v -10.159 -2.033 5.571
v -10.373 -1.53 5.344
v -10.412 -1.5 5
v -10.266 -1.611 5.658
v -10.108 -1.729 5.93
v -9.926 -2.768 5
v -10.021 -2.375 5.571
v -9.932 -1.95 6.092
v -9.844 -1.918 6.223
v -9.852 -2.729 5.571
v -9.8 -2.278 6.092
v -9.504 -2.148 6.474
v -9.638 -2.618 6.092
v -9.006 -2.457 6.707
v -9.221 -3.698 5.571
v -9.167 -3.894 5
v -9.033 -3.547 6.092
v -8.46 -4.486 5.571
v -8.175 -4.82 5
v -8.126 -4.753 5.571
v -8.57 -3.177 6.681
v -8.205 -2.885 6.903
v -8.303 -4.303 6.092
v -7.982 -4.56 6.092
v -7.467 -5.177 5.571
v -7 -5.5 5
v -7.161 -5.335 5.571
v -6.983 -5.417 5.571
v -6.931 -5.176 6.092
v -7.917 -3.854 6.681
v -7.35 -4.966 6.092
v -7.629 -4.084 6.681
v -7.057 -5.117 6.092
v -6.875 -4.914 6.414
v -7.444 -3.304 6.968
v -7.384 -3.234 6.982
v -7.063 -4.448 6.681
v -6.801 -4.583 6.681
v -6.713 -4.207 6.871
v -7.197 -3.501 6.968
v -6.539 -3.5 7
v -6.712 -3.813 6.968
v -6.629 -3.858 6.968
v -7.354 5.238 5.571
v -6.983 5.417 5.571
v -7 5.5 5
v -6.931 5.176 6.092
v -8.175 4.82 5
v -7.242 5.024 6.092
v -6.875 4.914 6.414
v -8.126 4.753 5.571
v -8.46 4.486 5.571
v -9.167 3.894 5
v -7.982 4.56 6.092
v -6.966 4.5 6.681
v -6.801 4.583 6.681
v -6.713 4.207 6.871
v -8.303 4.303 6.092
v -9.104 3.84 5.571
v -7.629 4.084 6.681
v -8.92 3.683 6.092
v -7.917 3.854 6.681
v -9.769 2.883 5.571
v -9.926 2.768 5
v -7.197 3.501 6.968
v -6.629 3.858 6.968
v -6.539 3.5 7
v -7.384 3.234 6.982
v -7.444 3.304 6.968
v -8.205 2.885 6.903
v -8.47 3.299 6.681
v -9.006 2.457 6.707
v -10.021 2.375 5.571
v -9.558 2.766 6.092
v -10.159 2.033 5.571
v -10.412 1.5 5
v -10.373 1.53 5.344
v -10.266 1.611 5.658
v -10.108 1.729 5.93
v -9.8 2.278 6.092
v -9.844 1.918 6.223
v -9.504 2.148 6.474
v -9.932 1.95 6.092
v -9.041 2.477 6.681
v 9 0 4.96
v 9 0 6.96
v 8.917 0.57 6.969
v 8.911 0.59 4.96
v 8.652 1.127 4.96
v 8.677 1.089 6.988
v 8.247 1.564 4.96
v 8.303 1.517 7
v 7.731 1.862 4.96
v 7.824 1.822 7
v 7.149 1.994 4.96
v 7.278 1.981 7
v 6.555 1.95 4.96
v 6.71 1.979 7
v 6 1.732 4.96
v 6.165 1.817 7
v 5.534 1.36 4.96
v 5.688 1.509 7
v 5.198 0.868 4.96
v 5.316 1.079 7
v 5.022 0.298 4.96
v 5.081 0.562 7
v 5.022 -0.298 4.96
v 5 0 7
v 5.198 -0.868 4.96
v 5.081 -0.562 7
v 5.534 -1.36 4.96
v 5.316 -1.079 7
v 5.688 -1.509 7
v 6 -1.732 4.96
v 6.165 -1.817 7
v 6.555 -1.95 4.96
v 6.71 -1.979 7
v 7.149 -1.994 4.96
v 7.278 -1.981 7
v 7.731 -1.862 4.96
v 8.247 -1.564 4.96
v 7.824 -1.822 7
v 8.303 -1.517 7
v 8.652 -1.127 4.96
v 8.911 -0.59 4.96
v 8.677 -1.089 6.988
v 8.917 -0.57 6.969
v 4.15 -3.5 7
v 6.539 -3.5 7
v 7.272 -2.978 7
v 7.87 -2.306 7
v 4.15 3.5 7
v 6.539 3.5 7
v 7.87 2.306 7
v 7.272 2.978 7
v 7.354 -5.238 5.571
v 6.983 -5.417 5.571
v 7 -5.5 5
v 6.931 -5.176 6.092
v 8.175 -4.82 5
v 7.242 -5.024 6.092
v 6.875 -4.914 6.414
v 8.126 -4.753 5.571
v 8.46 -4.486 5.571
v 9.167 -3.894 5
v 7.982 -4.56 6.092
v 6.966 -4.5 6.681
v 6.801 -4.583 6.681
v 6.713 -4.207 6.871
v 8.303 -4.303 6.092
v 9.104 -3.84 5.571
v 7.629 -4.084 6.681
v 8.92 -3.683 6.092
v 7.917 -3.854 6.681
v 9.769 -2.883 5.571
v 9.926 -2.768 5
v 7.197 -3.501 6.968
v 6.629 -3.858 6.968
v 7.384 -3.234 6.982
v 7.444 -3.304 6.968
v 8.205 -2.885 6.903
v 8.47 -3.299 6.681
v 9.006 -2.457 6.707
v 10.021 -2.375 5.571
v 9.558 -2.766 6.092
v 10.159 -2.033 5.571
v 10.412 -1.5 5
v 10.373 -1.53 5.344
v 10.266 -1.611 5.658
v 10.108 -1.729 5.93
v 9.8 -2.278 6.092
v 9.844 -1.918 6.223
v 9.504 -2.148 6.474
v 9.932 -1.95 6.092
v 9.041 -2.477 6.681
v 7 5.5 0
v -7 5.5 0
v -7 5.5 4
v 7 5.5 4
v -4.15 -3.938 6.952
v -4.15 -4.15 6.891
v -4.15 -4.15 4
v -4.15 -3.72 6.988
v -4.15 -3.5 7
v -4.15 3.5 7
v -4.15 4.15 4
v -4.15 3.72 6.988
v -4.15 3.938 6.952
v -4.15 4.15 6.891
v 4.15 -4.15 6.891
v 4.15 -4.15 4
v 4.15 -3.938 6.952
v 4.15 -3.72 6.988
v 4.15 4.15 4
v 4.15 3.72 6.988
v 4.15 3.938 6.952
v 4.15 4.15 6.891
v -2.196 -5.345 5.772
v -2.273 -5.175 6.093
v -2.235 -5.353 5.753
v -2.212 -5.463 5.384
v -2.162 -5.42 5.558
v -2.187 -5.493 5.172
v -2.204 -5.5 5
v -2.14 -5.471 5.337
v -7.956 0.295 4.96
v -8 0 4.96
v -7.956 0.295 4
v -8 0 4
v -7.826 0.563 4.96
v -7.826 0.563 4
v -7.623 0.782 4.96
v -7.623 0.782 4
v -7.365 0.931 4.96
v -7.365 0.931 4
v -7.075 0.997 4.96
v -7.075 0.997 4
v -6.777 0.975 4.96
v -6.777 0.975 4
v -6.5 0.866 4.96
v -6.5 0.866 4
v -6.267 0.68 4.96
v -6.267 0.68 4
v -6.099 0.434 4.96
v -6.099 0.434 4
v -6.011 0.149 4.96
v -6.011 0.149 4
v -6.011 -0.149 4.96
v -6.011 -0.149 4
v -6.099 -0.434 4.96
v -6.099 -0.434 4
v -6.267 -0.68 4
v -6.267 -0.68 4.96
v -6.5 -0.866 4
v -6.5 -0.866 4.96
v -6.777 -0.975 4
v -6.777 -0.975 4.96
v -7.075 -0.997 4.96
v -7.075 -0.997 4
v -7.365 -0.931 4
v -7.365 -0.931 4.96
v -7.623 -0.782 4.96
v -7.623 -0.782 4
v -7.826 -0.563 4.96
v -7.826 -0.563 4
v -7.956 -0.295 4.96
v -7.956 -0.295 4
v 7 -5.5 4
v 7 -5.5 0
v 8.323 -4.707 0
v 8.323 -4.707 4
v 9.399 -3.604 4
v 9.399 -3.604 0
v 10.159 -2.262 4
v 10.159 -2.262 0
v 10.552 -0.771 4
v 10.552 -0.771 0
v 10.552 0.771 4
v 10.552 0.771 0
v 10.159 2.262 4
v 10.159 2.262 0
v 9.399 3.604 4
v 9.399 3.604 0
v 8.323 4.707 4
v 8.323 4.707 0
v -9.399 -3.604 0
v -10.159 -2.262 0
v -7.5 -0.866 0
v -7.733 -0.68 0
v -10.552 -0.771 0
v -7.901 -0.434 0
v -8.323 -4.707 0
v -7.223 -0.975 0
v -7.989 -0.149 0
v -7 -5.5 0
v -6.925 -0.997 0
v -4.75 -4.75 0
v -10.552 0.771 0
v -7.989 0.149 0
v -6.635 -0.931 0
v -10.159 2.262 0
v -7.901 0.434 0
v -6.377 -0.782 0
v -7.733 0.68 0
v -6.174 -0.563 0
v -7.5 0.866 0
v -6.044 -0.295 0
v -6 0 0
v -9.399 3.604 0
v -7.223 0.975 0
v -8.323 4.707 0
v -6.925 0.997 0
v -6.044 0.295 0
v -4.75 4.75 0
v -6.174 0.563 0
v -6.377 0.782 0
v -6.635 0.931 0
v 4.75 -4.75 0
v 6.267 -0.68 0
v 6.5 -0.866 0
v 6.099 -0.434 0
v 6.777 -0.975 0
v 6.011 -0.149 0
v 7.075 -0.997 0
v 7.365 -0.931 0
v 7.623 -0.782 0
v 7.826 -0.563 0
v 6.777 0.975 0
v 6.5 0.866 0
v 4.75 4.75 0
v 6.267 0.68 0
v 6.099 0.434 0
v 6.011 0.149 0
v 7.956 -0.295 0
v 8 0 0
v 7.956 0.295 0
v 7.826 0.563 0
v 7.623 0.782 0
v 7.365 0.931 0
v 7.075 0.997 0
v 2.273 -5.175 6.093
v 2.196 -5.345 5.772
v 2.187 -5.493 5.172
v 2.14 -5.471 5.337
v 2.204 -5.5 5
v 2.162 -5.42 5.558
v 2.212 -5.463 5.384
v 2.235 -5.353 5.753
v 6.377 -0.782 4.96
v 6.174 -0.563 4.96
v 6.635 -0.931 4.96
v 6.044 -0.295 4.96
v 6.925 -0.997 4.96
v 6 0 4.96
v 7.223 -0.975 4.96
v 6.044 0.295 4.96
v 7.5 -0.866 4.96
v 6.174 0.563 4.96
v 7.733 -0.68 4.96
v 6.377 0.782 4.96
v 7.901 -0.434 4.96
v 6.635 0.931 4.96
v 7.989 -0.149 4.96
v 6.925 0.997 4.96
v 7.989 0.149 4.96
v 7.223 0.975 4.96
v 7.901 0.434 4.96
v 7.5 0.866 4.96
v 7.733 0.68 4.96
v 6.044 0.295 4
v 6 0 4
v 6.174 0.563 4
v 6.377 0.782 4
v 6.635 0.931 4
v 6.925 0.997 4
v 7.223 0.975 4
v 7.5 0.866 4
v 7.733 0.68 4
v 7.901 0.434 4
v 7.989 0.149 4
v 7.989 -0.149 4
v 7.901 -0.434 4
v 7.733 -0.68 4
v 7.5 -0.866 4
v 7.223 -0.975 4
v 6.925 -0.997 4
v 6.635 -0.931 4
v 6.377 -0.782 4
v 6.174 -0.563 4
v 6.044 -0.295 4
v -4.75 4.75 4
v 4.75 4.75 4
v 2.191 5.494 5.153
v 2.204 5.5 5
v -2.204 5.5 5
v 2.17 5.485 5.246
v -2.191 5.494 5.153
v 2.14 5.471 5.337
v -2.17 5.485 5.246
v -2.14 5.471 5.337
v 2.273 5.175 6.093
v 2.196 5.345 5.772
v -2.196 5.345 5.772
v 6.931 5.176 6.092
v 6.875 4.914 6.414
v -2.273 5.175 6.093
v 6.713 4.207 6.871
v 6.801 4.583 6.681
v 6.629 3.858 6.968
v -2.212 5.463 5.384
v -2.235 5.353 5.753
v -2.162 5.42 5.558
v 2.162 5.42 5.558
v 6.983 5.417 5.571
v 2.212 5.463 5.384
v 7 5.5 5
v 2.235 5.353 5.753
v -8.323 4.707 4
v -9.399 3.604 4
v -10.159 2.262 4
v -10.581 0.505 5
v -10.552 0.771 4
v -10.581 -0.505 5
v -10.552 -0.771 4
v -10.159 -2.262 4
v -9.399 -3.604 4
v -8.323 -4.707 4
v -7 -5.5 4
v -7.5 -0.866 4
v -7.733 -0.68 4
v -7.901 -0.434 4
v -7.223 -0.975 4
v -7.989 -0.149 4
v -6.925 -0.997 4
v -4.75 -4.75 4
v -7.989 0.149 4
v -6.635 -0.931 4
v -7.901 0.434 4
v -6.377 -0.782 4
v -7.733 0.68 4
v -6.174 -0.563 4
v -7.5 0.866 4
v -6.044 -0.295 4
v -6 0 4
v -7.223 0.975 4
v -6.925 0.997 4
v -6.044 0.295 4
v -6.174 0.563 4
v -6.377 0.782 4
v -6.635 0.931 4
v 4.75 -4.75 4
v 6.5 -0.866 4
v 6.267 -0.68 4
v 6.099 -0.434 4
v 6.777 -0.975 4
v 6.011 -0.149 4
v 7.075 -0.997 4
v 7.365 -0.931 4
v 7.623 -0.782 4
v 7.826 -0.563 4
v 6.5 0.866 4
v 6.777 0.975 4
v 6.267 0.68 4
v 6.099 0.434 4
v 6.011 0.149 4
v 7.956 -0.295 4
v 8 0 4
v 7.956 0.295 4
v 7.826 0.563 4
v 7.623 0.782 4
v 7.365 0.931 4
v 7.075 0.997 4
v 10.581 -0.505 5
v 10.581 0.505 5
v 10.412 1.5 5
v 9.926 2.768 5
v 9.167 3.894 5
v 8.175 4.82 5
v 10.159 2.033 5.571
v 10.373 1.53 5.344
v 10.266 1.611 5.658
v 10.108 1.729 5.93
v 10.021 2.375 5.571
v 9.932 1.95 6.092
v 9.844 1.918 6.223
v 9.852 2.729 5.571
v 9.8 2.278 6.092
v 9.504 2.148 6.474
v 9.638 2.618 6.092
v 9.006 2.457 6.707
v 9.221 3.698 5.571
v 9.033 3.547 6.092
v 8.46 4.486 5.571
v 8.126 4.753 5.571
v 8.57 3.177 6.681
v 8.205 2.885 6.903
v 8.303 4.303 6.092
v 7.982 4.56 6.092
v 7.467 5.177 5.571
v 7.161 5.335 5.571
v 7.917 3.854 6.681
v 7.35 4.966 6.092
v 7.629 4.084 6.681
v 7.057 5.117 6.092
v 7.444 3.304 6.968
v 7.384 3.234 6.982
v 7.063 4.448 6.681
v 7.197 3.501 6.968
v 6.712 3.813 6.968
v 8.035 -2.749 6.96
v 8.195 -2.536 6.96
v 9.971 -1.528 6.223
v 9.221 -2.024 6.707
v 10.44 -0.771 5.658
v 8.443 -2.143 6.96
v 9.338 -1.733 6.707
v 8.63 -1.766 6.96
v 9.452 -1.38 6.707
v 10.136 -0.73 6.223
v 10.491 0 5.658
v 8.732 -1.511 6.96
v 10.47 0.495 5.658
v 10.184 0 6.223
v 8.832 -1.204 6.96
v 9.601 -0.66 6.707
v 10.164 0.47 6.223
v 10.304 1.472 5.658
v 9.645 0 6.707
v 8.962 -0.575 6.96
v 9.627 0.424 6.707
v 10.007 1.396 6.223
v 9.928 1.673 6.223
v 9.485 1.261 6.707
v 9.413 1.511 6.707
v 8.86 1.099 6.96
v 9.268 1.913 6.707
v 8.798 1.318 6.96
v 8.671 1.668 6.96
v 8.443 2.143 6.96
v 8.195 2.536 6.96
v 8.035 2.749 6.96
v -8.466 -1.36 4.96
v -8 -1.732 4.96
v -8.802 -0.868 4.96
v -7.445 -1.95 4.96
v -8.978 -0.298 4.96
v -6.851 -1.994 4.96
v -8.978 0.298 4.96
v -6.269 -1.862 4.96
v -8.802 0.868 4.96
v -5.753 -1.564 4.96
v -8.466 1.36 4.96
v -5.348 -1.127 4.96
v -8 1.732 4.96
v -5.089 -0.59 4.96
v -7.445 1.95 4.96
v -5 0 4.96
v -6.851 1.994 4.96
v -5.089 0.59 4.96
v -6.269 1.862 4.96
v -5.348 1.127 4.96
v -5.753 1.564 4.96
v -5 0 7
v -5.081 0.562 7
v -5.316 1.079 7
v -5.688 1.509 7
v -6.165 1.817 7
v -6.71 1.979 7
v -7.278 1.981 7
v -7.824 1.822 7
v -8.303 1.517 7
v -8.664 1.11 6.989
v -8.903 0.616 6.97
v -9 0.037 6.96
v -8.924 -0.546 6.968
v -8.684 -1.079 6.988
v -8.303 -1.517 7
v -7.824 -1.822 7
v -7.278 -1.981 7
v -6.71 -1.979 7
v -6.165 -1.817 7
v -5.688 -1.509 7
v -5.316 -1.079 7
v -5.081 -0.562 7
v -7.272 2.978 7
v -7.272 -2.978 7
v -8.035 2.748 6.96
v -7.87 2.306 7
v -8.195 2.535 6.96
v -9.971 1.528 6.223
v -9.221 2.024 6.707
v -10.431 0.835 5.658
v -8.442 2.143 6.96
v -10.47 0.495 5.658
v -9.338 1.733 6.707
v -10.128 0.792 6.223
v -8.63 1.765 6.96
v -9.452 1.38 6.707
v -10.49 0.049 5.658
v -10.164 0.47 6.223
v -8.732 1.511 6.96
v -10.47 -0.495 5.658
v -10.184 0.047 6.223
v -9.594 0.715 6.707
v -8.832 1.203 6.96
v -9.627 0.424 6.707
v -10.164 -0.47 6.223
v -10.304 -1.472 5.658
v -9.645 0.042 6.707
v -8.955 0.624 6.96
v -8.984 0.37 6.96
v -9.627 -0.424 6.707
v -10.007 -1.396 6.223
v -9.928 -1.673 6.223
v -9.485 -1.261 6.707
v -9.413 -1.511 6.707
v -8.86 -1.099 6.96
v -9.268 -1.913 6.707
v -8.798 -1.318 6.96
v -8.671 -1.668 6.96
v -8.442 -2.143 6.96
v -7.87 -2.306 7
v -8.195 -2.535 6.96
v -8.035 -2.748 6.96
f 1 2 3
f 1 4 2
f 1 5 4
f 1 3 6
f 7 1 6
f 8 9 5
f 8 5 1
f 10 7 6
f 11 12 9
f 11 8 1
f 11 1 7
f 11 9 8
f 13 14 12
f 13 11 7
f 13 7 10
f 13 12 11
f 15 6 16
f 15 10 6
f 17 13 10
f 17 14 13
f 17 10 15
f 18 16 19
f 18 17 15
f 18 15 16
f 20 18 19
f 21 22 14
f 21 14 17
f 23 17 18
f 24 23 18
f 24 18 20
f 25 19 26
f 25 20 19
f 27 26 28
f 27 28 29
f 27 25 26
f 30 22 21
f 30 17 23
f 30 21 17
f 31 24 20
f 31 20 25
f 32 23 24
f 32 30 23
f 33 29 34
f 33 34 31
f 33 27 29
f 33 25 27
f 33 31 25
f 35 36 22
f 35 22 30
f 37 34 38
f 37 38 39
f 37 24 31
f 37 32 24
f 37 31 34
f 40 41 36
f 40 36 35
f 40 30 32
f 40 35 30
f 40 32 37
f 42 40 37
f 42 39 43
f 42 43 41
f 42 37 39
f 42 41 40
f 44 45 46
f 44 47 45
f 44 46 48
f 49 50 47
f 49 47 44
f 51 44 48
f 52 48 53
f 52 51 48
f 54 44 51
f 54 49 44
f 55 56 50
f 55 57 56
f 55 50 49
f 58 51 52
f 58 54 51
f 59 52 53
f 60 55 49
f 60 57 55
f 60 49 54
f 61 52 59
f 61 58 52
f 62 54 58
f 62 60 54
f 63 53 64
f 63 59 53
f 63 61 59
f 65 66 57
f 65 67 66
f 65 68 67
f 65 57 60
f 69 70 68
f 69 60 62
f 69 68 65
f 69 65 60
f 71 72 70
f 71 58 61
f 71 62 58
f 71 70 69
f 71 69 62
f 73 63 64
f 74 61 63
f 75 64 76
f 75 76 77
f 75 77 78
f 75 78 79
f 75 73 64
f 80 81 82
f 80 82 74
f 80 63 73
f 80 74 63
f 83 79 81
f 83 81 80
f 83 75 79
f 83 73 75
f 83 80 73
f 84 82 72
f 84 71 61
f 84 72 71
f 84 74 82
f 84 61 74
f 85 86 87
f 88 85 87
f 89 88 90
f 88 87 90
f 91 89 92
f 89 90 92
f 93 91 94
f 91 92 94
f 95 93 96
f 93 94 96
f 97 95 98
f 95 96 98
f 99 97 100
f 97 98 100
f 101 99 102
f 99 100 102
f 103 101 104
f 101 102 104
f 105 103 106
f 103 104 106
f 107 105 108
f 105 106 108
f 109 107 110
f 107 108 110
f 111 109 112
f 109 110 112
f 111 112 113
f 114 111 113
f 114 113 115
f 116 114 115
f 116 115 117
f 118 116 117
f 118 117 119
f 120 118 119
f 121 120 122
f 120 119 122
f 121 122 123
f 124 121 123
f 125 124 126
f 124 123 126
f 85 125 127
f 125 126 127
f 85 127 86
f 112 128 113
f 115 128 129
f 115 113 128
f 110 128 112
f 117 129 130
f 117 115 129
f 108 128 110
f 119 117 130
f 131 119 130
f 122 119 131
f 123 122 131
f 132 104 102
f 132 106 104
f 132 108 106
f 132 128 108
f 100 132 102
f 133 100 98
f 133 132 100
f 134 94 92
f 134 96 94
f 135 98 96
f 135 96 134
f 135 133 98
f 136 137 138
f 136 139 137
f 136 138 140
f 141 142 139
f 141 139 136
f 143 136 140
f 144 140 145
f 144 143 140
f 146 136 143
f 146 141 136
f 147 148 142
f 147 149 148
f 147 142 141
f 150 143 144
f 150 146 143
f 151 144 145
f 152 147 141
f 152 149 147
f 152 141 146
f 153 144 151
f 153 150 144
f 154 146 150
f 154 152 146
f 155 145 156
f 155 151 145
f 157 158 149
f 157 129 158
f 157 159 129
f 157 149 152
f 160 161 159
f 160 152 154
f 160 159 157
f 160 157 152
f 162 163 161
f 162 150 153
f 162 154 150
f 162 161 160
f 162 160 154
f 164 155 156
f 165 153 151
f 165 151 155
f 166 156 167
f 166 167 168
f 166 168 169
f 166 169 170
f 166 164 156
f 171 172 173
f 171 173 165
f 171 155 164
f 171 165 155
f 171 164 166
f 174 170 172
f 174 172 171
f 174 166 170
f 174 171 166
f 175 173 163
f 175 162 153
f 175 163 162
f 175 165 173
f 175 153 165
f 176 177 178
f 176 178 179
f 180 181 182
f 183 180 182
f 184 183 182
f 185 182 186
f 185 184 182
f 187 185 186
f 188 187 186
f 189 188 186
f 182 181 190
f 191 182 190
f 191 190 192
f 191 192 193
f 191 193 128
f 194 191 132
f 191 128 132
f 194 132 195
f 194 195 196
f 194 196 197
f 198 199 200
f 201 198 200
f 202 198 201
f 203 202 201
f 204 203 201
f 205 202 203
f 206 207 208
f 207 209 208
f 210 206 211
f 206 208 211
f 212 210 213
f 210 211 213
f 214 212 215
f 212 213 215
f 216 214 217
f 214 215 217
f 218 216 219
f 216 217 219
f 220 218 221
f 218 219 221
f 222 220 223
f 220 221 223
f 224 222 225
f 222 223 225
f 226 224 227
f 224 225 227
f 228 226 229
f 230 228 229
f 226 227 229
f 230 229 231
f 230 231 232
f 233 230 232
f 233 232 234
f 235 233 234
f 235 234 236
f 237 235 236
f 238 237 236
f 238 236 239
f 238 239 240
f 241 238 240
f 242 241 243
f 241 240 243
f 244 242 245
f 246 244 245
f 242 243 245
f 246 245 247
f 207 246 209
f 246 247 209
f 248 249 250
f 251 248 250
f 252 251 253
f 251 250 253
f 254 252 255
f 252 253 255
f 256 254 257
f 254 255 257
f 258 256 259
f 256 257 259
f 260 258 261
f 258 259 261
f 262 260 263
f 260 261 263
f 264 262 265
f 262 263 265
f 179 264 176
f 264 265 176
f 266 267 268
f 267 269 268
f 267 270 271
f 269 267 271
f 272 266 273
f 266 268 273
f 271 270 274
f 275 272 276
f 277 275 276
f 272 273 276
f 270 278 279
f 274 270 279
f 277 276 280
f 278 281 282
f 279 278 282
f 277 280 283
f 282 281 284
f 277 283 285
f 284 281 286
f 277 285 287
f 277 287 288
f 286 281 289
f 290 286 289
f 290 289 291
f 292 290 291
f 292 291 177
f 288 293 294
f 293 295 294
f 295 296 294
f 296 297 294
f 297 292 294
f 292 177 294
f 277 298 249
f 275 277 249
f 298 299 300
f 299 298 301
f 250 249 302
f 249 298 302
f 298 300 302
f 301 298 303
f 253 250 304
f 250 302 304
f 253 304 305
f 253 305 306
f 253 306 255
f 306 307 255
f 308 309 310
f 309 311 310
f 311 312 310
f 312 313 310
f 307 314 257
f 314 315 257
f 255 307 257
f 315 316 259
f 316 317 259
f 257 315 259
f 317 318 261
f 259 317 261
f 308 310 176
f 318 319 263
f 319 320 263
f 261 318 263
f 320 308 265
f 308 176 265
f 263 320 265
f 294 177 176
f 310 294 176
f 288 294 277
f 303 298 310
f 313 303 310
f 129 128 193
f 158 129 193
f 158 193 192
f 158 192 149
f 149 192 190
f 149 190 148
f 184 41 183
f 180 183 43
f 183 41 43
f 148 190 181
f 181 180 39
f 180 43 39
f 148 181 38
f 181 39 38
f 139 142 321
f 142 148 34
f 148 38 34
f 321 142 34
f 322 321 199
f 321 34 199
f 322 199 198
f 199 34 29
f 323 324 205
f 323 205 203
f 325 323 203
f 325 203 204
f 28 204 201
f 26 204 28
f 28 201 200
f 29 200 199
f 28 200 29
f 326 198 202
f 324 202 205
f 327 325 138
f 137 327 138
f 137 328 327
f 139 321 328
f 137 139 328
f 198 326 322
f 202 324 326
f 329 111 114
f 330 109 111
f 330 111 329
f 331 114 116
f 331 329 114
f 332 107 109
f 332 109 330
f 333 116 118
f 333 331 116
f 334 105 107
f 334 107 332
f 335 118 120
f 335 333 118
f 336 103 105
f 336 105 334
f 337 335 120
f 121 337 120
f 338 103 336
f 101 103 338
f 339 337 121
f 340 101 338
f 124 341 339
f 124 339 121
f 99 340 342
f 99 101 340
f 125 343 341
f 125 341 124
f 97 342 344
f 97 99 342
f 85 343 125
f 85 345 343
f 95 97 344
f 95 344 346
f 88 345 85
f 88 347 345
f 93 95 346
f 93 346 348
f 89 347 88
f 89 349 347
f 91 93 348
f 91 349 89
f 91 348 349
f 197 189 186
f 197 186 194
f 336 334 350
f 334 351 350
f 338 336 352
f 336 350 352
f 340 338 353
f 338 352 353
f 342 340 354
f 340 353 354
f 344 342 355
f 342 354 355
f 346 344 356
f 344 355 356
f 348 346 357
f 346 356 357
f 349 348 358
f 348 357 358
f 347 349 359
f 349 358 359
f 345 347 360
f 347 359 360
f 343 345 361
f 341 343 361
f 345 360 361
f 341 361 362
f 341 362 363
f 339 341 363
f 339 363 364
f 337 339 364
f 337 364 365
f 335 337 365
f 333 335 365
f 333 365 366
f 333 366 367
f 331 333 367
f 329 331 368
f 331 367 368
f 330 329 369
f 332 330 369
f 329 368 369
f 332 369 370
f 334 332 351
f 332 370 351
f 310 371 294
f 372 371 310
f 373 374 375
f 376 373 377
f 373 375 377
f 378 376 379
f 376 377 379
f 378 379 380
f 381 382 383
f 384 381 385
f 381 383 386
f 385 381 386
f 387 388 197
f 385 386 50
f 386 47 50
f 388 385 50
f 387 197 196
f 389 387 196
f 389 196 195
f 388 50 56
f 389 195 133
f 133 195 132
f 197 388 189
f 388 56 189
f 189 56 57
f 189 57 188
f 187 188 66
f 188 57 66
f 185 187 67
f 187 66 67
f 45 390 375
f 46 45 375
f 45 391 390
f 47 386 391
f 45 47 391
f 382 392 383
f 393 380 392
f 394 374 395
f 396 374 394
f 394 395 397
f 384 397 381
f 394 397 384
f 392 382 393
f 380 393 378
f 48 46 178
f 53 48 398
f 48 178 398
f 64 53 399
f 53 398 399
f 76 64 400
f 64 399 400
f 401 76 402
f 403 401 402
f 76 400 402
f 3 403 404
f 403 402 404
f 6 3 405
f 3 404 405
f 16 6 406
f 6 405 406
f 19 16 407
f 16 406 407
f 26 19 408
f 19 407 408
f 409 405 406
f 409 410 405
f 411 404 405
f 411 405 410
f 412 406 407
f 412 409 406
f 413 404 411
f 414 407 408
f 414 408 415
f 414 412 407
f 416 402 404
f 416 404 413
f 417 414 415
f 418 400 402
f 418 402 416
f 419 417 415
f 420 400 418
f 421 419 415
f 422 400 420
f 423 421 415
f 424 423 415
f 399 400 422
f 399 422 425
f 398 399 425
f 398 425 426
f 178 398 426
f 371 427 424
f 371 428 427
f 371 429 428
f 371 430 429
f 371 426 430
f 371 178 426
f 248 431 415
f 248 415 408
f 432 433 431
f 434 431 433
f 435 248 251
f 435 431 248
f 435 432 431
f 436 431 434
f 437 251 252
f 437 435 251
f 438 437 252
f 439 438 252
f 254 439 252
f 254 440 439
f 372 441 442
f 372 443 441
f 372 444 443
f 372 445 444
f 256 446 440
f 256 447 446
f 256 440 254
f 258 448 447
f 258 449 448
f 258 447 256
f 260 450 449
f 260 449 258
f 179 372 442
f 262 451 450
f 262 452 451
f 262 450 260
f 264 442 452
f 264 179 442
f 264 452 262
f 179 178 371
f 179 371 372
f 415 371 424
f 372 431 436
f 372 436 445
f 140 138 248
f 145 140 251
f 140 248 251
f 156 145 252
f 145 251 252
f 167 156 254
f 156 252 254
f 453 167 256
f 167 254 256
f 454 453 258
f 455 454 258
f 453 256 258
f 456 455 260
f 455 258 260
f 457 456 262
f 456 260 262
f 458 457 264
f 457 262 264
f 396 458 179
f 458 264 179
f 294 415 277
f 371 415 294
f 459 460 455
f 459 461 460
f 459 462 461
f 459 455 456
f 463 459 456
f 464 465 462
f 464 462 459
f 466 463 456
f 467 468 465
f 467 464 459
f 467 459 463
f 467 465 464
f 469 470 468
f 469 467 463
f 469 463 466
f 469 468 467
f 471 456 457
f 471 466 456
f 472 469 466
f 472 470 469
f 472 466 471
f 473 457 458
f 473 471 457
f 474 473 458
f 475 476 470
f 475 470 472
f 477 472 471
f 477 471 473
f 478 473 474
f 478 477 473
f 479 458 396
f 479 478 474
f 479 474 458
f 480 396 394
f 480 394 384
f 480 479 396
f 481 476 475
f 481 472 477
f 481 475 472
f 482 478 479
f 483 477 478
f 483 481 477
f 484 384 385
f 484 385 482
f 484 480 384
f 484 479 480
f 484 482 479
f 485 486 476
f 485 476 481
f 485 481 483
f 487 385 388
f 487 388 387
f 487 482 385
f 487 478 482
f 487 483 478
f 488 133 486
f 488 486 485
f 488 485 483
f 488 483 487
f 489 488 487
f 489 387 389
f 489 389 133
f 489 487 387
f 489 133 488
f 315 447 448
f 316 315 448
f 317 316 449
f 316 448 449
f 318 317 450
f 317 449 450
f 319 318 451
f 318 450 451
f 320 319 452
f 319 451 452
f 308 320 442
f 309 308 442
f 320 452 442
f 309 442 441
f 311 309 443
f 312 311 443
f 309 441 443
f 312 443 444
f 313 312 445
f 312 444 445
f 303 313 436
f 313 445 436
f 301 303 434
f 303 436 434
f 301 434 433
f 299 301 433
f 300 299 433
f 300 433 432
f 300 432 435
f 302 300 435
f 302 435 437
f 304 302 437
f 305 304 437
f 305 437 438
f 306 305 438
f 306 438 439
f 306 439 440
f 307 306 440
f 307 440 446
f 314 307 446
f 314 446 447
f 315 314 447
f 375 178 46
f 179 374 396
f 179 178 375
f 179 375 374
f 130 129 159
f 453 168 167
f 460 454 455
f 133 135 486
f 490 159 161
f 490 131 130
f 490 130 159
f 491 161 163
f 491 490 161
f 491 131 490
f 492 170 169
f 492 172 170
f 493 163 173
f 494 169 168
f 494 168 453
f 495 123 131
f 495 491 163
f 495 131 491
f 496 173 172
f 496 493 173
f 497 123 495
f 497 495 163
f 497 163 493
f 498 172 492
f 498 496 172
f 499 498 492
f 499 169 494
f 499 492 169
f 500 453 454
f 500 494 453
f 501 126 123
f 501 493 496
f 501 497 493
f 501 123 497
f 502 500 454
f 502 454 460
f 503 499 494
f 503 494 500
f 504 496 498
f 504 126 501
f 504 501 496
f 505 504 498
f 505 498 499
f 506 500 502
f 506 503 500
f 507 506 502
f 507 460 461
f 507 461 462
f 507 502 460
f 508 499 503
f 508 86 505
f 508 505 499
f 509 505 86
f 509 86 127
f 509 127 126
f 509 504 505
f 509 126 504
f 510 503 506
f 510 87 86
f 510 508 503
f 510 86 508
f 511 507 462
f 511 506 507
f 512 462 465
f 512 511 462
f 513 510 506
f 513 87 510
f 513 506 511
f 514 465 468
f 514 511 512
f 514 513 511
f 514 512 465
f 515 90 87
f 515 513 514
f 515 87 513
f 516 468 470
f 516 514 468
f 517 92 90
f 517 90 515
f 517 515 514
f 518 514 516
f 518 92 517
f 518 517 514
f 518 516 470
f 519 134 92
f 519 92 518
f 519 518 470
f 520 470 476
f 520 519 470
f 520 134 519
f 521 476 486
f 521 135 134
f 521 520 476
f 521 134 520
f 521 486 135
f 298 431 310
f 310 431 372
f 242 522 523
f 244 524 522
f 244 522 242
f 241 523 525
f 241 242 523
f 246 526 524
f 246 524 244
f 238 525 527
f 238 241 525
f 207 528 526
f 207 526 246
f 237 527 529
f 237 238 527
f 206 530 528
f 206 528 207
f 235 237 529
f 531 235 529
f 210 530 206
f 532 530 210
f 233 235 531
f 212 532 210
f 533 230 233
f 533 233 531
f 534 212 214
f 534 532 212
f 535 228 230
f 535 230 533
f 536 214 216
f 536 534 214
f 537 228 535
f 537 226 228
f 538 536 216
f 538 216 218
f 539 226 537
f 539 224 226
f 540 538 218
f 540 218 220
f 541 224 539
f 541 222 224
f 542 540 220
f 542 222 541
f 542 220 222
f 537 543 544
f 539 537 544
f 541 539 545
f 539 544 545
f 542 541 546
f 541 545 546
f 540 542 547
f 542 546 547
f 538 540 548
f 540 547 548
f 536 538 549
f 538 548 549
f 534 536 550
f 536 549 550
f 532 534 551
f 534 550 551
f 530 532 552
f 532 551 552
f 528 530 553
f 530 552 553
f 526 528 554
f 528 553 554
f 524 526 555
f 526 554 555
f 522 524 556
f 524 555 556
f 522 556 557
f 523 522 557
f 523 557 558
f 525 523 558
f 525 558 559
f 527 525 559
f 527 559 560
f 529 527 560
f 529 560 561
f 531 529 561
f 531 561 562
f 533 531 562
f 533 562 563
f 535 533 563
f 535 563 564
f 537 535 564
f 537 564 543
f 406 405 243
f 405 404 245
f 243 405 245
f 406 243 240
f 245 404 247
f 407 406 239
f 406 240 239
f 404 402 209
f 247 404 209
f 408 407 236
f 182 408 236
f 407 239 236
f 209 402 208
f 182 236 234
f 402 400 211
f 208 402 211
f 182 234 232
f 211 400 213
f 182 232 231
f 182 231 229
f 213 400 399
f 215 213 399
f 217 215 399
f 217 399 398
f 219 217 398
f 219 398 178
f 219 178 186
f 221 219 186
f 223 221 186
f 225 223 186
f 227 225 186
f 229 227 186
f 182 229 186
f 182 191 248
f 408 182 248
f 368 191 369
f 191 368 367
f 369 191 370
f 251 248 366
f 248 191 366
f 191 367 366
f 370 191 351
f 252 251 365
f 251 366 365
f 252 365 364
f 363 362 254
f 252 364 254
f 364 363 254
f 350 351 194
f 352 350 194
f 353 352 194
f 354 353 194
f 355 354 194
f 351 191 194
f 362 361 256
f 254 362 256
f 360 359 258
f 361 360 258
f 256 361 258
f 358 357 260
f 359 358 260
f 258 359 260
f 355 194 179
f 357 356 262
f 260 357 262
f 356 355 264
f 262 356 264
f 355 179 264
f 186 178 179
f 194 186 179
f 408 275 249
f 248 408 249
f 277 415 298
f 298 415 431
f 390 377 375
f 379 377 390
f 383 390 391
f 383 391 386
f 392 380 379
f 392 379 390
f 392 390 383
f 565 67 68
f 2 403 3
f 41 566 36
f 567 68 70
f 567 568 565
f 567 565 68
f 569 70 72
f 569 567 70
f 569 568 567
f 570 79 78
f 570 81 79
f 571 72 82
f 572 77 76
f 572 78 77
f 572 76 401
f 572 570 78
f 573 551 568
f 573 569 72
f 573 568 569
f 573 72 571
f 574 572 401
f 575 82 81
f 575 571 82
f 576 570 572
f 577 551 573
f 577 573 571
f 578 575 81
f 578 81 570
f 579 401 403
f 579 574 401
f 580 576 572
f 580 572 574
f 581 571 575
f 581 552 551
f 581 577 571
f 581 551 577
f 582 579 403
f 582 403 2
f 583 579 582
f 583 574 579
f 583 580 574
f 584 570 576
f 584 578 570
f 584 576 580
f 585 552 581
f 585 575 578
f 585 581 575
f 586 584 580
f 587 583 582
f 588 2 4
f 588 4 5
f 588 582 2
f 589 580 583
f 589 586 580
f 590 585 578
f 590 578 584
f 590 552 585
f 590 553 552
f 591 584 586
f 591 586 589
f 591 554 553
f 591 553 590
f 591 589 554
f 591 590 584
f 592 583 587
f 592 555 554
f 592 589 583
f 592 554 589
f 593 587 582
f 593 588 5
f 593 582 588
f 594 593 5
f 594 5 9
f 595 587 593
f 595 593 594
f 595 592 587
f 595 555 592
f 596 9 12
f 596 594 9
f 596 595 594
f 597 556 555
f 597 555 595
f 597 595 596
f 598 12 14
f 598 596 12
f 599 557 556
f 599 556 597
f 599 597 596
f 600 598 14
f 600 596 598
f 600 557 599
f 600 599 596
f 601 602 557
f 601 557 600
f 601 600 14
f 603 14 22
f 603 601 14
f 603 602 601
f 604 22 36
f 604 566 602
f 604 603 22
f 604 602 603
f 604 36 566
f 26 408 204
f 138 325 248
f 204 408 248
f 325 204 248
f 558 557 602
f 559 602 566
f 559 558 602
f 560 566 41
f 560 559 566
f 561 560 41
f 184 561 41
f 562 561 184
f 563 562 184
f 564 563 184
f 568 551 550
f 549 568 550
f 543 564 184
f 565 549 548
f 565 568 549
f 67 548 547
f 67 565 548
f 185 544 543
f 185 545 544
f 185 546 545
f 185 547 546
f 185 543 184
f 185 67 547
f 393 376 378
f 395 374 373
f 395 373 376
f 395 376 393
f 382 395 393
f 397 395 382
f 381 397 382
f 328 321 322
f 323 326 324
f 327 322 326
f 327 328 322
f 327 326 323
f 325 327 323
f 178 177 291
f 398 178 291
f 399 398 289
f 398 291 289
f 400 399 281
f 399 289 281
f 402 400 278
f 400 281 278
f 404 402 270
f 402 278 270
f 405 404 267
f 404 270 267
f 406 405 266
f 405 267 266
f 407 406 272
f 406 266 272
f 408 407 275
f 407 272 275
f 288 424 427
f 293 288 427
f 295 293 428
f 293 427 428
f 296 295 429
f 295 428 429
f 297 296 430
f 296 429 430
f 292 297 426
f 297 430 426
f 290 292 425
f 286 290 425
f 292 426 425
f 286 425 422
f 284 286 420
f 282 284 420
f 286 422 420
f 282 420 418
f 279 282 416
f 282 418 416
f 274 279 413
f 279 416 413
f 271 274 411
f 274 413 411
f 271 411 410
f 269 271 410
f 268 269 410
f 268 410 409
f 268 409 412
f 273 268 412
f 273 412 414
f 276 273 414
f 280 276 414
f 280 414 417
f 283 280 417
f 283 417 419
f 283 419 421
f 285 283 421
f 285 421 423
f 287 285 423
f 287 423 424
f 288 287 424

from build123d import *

# Parameters (mm, degrees)
F0_W           = 14
F0_H           = 11
F1_DEPTH       = 4
F2_R           = 1
F2_W           = 9.5
F2_H           = 9.5
F3_DEPTH       = 5
F4_W           = 14
F4_H           = 11
F5_DEPTH       = 3
F6_W           = 8.3
F6_H           = 8.3
F7_DEPTH       = 3
F8_T1_DEPTH    = 24
F8_T6_ANGLE    = 228.4636950683
F8_S7_R        = 2
F8_T8_DEPTH    = 9
F8_S9_R        = 2
F8_T10_DEPTH   = 9
F8_T14_ANGLE   = 228.4636950683
F8_T19_ANGLE   = 228.4636950683
F8_S20_R       = 2
F8_T21_DEPTH   = 9
F8_S22_R       = 2
F8_T23_DEPTH   = 9
F8_T27_ANGLE   = 228.4636950683
F9_D           = 2
F9_DEPTH       = 20
F9_START       = 0.039984
F9_CBORE_D     = 4
F9_CBORE_DEPTH = 2
F9_TIP         = 0.600860619


# Not quite as in the source:
# - a fillet or chamfer that OpenCascade refuses, or shapes differently, is made with other operations: its cross-section is extruded or revolved along the edge and cut away or added


with BuildPart() as f1:
    # F0 (on Top) → F1 (new body)
    with BuildSketch(Plane.XY):
        Rectangle(F0_W, F0_H)
        with BuildLine():
            ThreePointArc((7, -5.5), (10.6020842383, 0), (7, 5.5))
            Line((7, 5.5), (7, -5.5))
        make_face()
        with BuildLine():
            Line((-7, -5.5), (-7, 5.5))
            ThreePointArc((-7, 5.5), (-10.6020842383, 0), (-7, -5.5))
        make_face()
    extrude(amount=F1_DEPTH)

    # F2 (on face) → F3 (cut)
    with BuildSketch(Plane.XY.offset(4)):
        with Locations((-7, 0)):
            Circle(F2_R)
        with Locations((7, 0)):
            Circle(F2_R)
        Rectangle(F2_W, F2_H)
    extrude(amount=-F3_DEPTH, mode=Mode.SUBTRACT)


with BuildPart() as f5:
    # F4 (on face) → F5 (new body)
    with BuildSketch(Plane.XY.offset(4)):
        Rectangle(F4_W, F4_H)
        with BuildLine():
            ThreePointArc((7, -5.5), (10.6020842383, 0), (7, 5.5))
            Line((7, 5.5), (7, -5.5))
        make_face()
        with BuildLine():
            Line((-7, -5.5), (-7, 5.5))
            ThreePointArc((-7, 5.5), (-10.6020842383, 0), (-7, -5.5))
        make_face()
    extrude(amount=F5_DEPTH)

    # F6 (on face) → F7 (cut)
    with BuildSketch(Plane.XY.offset(7)):
        Rectangle(F6_W, F6_H)
    extrude(amount=-F7_DEPTH, mode=Mode.SUBTRACT)

    # F8: fillet of radius 2 on 4 edges, made by hand

    # F8_s2 → F8_t1 (cut)
    with BuildSketch(Plane.YZ.offset(-12)):
        with BuildLine():
            ThreePointArc((5.5, 5), (4.9142135624, 6.4142135624), (3.5, 7))
            Line((3.5, 7), (5.5, 7))
            Line((5.5, 7), (5.5, 5))
        make_face()
        with BuildLine():
            ThreePointArc((-3.5, 7), (-4.9142135624, 6.4142135624), (-5.5, 5))
            Line((-5.5, 5), (-5.5, 7))
            Line((-5.5, 7), (-3.5, 7))
        make_face()
    extrude(amount=F8_T1_DEPTH, mode=Mode.SUBTRACT)


with BuildPart() as f8_tool4:
    # F8_s5 → F8_t6 (revolve)
    with BuildSketch(Plane(origin=(3.8268504556, -1.7224121907, 0), x_dir=(0, 0, 1), z_dir=(-0.9118921219, 0.4104299673, 0))):
        with BuildLine():
            ThreePointArc((5, -4.1111667166), (6.4142135624, -3.525380279), (7, -2.1111667166))
            Line((7, -2.1111667166), (7, -4.1111667166))
            Line((7, -4.1111667166), (5, -4.1111667166))
        make_face()
    revolve(axis=Axis((4.6020842383, 0, 7), (0, 0, 1)), revolution_arc=F8_T6_ANGLE)

    # F8_s7 → F8_t8 (cut, symmetric)
    with BuildSketch(Plane.YZ.offset(6.3)):
        with Locations((3.5, 5)):
            Circle(F8_S7_R)
    extrude(amount=F8_T8_DEPTH, both=True, mode=Mode.SUBTRACT)

    # F8_s9 → F8_t10 (cut, symmetric)
    with BuildSketch(Plane.YZ.offset(6.3)):
        with Locations((-3.5, 5)):
            Circle(F8_S9_R)
    extrude(amount=F8_T10_DEPTH, both=True, mode=Mode.SUBTRACT)


with BuildPart() as f5_1:
    add(f5.part)

    # F8_t3: cut F8_tool4
    add(f8_tool4.part, mode=Mode.SUBTRACT)


with BuildPart() as f8_tool12:
    # F8_s13 → F8_t14 (revolve)
    with BuildSketch(Plane(origin=(3.8268504556, -1.7224121907, 0), x_dir=(0, 0, 1), z_dir=(-0.9118921219, 0.4104299673, 0))):
        with BuildLine():
            ThreePointArc((5, -4.1111667166), (6.4142135624, -3.525380279), (7, -2.1111667166))
            Line((7, -2.1111667166), (7, -4.1111667166))
            Line((7, -4.1111667166), (5, -4.1111667166))
        make_face()
    revolve(axis=Axis((4.6020842383, 0, 7), (0, 0, 1)), revolution_arc=F8_T14_ANGLE)

    split(bisect_by=Plane.YZ.offset(4.15), keep=Keep.TOP)


with BuildPart() as f5_2:
    add(f5_1.part)

    # F8_t11: cut F8_tool12
    add(f8_tool12.part, mode=Mode.SUBTRACT)


with BuildPart() as f8_tool17:
    # F8_s18 → F8_t19 (revolve)
    with BuildSketch(Plane(origin=(-3.8268504556, 1.7224121907, 0), x_dir=(0, 0, 1), z_dir=(0.9118921219, -0.4104299673, 0))):
        with BuildLine():
            ThreePointArc((5, -4.1111667166), (6.4142135624, -3.525380279), (7, -2.1111667166))
            Line((7, -2.1111667166), (7, -4.1111667166))
            Line((7, -4.1111667166), (5, -4.1111667166))
        make_face()
    revolve(axis=Axis((-4.6020842383, 0, 7), (0, 0, 1)), revolution_arc=F8_T19_ANGLE)

    # F8_s20 → F8_t21 (cut, symmetric)
    with BuildSketch(Plane.YZ.offset(-6.3)):
        with Locations((3.5, 5)):
            Circle(F8_S20_R)
    extrude(amount=F8_T21_DEPTH, both=True, mode=Mode.SUBTRACT)

    # F8_s22 → F8_t23 (cut, symmetric)
    with BuildSketch(Plane.YZ.offset(-6.3)):
        with Locations((-3.5, 5)):
            Circle(F8_S22_R)
    extrude(amount=F8_T23_DEPTH, both=True, mode=Mode.SUBTRACT)


with BuildPart() as f5_3:
    add(f5_2.part)

    # F8_t16: cut F8_tool17
    add(f8_tool17.part, mode=Mode.SUBTRACT)


with BuildPart() as f8_tool25:
    # F8_s26 → F8_t27 (revolve)
    with BuildSketch(Plane(origin=(-3.8268504556, 1.7224121907, 0), x_dir=(0, 0, 1), z_dir=(0.9118921219, -0.4104299673, 0))):
        with BuildLine():
            ThreePointArc((5, -4.1111667166), (6.4142135624, -3.525380279), (7, -2.1111667166))
            Line((7, -2.1111667166), (7, -4.1111667166))
            Line((7, -4.1111667166), (5, -4.1111667166))
        make_face()
    revolve(axis=Axis((-4.6020842383, 0, 7), (0, 0, 1)), revolution_arc=F8_T27_ANGLE)

    split(bisect_by=Plane.YZ.offset(-4.15), keep=Keep.BOTTOM)


with BuildPart() as f5_4:
    add(f5_3.part)

    # F8_t24: cut F8_tool25
    add(f8_tool25.part, mode=Mode.SUBTRACT)

    # F9
    # its depths count from where the whole tool has entered the part; down to there all is cleared
    with Locations(Plane.XY.offset(7).offset(-F9_START)):
        with Locations((7, 0), (-7, 0)):
            CounterBoreHole(F9_D / 2, F9_CBORE_D / 2, F9_CBORE_DEPTH, depth=F9_DEPTH)
            with Locations((0, 0, -(F9_DEPTH + F9_TIP / 2))):  # 118° drill point
                Cone(0, F9_D / 2, F9_TIP, mode=Mode.SUBTRACT)


solid = Compound([f1.part, f5_4.part])
